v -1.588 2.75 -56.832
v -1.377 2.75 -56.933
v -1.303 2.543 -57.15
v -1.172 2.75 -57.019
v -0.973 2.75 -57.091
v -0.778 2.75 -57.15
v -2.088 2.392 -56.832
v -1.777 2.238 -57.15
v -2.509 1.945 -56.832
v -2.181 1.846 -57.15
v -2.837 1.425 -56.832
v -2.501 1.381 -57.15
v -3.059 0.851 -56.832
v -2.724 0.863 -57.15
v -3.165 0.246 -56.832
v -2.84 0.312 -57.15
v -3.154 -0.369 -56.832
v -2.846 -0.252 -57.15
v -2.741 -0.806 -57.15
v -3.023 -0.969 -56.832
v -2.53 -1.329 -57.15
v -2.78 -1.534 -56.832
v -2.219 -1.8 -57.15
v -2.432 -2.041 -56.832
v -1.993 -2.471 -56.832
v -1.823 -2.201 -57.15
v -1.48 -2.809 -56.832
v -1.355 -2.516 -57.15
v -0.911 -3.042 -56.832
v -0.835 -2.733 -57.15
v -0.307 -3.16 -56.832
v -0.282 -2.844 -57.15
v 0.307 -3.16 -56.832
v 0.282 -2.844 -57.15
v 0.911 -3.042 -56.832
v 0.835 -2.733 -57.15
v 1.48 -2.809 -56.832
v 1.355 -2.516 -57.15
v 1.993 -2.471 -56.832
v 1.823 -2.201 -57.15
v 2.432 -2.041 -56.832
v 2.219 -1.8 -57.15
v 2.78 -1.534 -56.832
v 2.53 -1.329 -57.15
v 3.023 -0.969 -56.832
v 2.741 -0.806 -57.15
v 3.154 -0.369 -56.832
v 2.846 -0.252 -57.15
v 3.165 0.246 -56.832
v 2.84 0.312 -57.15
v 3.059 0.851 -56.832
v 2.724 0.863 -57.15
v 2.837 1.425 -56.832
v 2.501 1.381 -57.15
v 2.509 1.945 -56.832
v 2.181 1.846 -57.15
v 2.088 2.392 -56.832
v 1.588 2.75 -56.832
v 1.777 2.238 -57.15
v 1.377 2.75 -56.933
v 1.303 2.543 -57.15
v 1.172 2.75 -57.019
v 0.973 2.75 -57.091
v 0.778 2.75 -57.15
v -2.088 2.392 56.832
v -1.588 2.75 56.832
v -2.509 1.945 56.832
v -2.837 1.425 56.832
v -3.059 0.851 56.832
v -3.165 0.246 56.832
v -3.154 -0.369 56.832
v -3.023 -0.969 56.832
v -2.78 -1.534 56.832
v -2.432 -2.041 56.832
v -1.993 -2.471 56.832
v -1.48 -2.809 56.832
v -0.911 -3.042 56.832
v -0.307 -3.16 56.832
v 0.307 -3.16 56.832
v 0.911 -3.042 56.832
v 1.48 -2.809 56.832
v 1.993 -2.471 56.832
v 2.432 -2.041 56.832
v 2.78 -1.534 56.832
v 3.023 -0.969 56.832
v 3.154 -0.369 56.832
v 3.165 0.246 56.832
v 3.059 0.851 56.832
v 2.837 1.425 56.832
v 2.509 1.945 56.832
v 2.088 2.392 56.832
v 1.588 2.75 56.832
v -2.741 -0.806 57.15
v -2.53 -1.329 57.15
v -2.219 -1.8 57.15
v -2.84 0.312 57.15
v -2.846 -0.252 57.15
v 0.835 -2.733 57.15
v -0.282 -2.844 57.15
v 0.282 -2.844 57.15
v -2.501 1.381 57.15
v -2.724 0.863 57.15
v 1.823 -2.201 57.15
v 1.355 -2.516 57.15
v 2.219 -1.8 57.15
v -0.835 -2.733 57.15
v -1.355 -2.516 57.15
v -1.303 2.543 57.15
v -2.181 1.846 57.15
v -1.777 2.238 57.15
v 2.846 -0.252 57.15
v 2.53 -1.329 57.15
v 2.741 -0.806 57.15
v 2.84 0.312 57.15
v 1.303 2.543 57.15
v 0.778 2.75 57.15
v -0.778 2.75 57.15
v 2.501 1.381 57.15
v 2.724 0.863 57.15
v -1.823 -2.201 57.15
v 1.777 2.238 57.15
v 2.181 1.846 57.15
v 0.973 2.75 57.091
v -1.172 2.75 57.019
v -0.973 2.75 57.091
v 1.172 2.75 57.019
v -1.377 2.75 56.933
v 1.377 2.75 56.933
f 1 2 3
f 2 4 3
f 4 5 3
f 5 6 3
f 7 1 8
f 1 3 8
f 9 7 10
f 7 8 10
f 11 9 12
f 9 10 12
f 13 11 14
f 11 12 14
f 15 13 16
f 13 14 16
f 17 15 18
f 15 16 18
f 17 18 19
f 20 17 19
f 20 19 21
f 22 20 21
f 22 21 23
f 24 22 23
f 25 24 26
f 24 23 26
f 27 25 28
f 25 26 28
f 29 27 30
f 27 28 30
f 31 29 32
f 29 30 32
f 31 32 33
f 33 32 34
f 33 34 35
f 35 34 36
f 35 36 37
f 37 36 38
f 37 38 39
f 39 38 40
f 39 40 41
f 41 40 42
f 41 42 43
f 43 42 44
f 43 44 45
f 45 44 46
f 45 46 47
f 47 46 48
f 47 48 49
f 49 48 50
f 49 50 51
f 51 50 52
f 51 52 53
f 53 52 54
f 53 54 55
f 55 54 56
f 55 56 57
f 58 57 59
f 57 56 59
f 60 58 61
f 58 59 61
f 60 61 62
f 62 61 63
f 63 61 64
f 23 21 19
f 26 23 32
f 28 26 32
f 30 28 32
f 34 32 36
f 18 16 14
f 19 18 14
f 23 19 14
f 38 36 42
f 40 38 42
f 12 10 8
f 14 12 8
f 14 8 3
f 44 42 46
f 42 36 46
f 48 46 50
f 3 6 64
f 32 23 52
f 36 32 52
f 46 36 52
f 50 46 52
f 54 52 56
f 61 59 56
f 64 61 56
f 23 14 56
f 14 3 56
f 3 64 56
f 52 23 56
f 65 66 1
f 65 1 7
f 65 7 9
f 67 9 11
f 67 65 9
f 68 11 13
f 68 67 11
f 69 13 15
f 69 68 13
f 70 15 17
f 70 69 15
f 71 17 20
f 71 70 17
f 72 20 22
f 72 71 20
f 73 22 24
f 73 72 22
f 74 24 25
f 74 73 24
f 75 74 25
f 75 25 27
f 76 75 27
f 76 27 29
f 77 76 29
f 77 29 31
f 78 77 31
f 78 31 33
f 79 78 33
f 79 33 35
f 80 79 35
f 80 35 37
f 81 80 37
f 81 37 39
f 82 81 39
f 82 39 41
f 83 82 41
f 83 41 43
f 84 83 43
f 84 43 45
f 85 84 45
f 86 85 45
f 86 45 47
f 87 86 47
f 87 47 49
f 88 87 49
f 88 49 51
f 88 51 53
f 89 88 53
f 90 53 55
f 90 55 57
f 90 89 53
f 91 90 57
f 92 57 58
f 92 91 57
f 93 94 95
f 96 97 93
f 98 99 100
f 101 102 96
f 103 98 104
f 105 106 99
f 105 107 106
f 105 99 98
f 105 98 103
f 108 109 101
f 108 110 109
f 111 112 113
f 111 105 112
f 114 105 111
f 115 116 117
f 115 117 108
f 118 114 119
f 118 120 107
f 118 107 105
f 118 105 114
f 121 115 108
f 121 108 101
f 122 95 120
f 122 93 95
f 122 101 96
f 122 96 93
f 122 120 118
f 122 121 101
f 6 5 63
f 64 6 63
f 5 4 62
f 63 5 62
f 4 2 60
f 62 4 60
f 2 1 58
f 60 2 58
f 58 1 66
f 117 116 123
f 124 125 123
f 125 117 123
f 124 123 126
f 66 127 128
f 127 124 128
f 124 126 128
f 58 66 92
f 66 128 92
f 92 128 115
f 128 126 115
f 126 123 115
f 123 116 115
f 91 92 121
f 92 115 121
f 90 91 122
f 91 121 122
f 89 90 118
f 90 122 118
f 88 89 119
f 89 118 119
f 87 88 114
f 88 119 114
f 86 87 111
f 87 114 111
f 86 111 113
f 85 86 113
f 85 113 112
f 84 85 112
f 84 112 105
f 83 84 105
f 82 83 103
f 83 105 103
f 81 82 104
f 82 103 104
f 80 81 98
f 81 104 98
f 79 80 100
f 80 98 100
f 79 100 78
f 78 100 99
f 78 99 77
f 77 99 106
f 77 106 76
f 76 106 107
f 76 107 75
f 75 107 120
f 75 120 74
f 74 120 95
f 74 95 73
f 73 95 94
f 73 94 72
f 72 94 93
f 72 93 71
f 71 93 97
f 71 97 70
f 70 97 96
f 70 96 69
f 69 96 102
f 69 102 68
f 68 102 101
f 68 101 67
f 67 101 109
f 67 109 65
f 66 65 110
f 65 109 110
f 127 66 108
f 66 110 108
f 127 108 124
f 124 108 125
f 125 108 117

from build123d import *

# Parameters (mm, degrees)
SKETCH3_R                = 3.175
BOSS_EXTRUDE2_DEPTH      = 57.15
BOSS_EXTRUDE2_DEPTH_BACK = 57.15
CUT_EXTRUDE5_DEPTH       = 58.15
CUT_EXTRUDE5_DEPTH_BACK  = 58.15
CHAMFER1_SIZE            = 0.3175


with BuildPart() as part:
    # Sketch3 → Boss-Extrude2 (new body, two sides)
    with BuildSketch(Plane.XY) as boss_extrude2_sk:
        Circle(SKETCH3_R)
    extrude(amount=BOSS_EXTRUDE2_DEPTH)
    extrude(boss_extrude2_sk.sketch, amount=-BOSS_EXTRUDE2_DEPTH_BACK)

    # Sketch10 → Cut-Extrude5 (cut, two sides)
    with BuildSketch(Plane.XY) as cut_extrude5_sk:
        with BuildLine():
            Line((-1.5875, 2.749630657), (1.5875, 2.749630657))
            ThreePointArc((1.5875, 2.749630657), (0, 3.175), (-1.5875, 2.749630657))
        make_face()
    extrude(amount=CUT_EXTRUDE5_DEPTH, mode=Mode.SUBTRACT)
    extrude(cut_extrude5_sk.sketch, amount=-CUT_EXTRUDE5_DEPTH_BACK, mode=Mode.SUBTRACT)

    # Chamfer1
    chamfer1_edges = [part.edges().sort_by_distance(p)[0] for p in [
        (0, -3.175, -57.15),
        (0, -3.175, 57.15),
    ]]
    chamfer(chamfer1_edges, length=CHAMFER1_SIZE)


solid = part.part
